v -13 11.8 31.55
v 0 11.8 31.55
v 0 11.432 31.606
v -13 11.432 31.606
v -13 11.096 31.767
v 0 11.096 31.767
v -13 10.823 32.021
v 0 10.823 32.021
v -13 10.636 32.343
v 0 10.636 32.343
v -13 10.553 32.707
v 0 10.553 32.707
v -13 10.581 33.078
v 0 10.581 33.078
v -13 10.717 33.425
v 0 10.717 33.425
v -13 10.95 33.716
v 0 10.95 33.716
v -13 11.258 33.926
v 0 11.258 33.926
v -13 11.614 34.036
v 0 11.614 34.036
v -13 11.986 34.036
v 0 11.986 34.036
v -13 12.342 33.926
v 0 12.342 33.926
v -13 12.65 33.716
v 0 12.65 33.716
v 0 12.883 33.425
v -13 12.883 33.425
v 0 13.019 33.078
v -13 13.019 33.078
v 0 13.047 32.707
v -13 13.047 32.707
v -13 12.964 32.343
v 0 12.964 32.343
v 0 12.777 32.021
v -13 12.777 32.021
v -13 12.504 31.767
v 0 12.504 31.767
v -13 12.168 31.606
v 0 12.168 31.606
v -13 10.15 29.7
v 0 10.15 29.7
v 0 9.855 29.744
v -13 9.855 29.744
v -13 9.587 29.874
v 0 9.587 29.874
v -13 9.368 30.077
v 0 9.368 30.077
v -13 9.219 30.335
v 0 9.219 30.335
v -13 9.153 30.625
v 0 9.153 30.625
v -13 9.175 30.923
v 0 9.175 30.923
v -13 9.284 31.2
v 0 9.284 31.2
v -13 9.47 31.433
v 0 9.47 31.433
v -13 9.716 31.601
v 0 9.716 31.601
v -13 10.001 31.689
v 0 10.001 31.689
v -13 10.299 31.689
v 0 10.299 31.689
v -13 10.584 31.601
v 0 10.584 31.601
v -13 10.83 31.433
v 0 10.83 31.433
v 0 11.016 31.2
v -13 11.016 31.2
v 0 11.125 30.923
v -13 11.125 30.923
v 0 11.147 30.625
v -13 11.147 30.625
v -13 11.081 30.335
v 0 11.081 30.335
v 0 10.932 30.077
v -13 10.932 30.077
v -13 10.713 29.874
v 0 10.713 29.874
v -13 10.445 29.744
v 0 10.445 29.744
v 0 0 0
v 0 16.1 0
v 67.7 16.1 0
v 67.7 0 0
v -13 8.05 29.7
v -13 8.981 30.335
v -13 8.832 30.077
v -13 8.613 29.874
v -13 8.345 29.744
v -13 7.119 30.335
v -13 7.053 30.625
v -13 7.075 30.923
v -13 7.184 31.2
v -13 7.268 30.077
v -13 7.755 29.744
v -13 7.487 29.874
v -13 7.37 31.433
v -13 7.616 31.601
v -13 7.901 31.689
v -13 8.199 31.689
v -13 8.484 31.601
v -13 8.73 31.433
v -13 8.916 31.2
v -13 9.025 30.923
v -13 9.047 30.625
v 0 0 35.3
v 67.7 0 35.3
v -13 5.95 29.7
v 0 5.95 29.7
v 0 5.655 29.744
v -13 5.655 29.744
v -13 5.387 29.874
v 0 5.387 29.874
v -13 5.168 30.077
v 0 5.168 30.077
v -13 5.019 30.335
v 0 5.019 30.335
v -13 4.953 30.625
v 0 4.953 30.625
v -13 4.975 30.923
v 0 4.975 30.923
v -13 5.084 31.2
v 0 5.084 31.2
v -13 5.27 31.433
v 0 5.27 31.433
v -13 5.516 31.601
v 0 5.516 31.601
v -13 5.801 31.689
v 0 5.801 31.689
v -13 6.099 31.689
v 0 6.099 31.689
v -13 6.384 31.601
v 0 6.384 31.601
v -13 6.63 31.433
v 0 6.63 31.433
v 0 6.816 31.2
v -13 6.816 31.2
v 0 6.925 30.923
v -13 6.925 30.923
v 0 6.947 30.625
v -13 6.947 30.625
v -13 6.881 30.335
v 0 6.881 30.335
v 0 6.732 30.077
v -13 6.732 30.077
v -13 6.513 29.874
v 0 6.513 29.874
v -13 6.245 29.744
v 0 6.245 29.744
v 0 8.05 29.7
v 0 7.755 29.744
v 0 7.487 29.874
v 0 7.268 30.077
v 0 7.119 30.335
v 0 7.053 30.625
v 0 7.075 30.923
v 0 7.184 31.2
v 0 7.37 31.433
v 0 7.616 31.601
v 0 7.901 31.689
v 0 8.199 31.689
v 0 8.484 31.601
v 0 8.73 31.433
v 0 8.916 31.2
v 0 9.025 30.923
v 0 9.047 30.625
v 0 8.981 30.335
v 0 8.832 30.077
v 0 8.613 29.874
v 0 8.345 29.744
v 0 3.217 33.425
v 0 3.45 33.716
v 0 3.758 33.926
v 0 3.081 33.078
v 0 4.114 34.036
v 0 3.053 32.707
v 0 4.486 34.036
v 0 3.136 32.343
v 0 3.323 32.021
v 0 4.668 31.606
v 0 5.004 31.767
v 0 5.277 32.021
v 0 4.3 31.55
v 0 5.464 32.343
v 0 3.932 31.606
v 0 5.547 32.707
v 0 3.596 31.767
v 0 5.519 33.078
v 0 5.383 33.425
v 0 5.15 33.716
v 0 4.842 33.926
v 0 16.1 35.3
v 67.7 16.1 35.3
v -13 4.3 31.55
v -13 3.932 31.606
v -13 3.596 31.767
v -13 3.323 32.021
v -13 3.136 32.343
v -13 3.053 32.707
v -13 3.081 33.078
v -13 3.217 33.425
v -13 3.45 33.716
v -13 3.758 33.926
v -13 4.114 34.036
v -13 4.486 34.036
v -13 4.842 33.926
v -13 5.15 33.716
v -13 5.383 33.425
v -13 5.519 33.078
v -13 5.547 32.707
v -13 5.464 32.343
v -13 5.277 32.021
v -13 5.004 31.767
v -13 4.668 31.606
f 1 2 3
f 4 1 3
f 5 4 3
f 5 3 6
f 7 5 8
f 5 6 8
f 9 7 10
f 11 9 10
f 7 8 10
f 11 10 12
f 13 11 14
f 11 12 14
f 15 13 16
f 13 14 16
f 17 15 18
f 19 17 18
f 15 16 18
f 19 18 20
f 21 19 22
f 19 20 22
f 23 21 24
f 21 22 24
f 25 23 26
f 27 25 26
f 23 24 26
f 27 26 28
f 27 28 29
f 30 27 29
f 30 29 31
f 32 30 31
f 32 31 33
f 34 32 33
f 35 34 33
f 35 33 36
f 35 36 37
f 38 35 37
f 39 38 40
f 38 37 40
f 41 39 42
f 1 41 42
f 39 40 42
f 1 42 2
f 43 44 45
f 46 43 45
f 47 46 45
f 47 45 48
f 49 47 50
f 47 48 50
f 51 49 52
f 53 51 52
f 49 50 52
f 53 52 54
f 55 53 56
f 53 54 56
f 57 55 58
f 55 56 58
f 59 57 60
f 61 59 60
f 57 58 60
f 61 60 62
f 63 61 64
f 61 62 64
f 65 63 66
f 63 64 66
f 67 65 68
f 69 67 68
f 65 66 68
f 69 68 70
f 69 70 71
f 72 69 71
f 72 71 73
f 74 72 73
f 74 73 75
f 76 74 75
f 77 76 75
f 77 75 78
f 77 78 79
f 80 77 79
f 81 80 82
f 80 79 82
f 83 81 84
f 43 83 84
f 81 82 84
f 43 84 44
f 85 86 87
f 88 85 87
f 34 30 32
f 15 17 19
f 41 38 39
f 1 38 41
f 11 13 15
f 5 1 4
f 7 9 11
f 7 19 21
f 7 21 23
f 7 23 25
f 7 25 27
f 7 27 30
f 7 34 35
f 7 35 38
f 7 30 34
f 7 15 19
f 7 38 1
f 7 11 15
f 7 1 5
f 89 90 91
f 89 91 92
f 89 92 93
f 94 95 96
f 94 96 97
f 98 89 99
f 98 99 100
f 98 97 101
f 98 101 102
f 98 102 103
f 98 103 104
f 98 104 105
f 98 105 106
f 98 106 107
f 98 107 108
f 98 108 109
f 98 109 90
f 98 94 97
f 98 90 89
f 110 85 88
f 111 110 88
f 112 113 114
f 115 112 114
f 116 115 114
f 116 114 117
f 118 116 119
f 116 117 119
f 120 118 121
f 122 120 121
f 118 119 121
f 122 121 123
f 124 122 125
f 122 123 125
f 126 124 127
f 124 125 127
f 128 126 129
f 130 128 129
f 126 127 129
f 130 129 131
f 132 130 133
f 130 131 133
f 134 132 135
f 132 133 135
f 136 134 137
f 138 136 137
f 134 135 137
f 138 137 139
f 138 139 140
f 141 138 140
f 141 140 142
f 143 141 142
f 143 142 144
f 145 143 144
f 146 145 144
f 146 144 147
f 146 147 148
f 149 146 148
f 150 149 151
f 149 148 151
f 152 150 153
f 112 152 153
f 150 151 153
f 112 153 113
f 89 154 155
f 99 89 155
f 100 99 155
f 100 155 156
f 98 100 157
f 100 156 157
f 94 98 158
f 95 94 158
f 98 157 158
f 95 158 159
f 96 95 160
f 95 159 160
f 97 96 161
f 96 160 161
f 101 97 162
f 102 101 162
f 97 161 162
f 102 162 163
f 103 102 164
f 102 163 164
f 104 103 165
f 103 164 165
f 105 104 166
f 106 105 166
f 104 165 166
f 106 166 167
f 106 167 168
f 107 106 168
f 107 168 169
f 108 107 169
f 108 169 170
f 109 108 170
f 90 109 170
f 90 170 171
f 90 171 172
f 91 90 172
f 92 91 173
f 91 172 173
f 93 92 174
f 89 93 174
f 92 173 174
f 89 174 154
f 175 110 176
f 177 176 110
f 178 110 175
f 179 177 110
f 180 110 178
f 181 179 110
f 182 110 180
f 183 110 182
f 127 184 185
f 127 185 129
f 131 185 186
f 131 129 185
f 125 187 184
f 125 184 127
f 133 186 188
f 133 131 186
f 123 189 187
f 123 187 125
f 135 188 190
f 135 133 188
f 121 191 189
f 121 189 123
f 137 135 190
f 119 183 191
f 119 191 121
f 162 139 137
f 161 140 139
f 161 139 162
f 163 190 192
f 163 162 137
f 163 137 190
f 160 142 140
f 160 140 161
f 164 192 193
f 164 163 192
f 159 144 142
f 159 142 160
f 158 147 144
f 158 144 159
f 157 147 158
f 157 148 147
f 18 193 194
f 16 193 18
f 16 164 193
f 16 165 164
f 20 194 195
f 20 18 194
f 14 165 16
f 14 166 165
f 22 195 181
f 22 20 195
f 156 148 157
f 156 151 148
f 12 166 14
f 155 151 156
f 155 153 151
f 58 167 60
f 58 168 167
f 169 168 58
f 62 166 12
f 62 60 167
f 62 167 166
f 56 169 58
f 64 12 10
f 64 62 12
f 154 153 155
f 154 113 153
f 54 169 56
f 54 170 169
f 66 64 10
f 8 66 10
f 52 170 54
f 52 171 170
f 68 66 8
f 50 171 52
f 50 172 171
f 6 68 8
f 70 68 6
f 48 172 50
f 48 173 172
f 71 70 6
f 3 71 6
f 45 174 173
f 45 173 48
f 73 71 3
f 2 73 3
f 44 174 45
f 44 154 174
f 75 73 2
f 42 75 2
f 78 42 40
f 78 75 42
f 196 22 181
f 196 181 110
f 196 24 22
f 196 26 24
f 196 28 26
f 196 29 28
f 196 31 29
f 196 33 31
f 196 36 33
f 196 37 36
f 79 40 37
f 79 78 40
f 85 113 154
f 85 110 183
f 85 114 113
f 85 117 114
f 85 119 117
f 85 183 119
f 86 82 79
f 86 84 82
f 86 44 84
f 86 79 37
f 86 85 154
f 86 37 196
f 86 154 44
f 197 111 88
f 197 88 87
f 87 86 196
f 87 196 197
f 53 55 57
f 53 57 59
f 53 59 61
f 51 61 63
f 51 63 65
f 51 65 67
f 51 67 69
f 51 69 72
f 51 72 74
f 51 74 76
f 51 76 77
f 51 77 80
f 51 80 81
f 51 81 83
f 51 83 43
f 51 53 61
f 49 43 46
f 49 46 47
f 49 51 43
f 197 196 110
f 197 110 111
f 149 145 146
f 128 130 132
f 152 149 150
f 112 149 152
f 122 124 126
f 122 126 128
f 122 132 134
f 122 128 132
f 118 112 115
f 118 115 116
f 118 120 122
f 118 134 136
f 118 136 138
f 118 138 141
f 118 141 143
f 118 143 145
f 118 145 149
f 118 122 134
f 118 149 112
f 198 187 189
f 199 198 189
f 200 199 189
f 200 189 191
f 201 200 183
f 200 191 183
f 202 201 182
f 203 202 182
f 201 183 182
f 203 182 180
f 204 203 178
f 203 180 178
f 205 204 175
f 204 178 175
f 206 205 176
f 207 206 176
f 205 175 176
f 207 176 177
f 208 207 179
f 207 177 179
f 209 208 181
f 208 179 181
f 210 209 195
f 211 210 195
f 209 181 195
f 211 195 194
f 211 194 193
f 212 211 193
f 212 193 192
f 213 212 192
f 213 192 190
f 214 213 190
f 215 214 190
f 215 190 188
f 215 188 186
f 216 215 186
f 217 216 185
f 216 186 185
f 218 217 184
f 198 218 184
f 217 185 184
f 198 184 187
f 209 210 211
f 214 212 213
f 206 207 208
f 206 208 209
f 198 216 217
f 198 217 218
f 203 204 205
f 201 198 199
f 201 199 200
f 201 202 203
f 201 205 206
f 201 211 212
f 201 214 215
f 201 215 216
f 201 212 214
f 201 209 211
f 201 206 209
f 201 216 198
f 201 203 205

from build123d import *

# Parameters (mm, degrees)
SKETCH1_W           = 67.7
SKETCH1_H           = 16.1
BOSS_EXTRUDE1_DEPTH = 35.3
SKETCH3_R           = 1
SKETCH3_R_2         = 1.25
BOSS_EXTRUDE2_DEPTH = 13


with BuildPart() as part:
    # Sketch1 → Boss-Extrude1 (new body)
    with BuildSketch(Plane.XY):
        with Locations((33.85, 8.05)):
            Rectangle(SKETCH1_W, SKETCH1_H)
    extrude(amount=BOSS_EXTRUDE1_DEPTH)

    # Sketch3 → Boss-Extrude2 (add)
    with BuildSketch(Plane.ZY):
        with Locations(Location((30.7, 10.15, 0), (0, 0, 180))):
            Circle(SKETCH3_R)
        with Locations(Location((30.7, 8.05, 0), (0, 0, 180))):
            Circle(SKETCH3_R)
        with Locations(Location((30.7, 5.95, 0), (0, 0, 180))):
            Circle(SKETCH3_R)
        with Locations(Location((32.8, 4.3, 0), (0, 0, 180))):
            Circle(SKETCH3_R_2)
        with Locations(Location((32.8, 11.8, 0), (0, 0, 180))):
            Circle(SKETCH3_R_2)
    extrude(amount=BOSS_EXTRUDE2_DEPTH)


solid = part.part
